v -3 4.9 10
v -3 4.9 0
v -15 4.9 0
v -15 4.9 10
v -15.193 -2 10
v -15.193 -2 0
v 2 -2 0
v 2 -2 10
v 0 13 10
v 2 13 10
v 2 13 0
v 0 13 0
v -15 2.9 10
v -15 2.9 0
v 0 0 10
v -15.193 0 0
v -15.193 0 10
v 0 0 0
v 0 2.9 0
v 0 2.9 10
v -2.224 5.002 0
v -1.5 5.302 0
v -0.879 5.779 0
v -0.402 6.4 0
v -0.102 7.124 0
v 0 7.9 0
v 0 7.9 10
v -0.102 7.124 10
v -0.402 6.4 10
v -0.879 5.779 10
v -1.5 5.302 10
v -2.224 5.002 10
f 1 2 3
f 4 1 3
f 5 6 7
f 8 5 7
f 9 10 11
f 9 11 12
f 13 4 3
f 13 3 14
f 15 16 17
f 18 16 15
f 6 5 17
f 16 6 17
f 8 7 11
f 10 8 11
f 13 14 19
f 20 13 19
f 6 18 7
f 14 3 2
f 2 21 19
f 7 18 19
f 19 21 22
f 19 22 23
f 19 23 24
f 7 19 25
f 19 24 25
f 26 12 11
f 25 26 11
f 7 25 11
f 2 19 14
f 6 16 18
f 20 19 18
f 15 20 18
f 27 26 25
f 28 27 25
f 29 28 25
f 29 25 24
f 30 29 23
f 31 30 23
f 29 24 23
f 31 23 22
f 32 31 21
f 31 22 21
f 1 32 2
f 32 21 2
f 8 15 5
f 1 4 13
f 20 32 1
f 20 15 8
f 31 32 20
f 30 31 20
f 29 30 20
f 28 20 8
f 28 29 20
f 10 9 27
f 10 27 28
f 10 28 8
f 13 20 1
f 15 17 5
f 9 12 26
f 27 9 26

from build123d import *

# Parameters (mm, degrees)
F0_W     = 15.193479
F0_H     = 2
F1_DEPTH = 10


with BuildPart() as f1:
    # F0 (on Top) → F1 (new body)
    with BuildSketch(Plane.XY):
        with Locations((-7.596739, -1)):
            Rectangle(F0_W, F0_H)
        with BuildLine():
            Line((0, 2.9), (0, 0))
            Line((0, 0), (0, -2))
            Line((0, -2), (2, -2))
            Line((2, -2), (2, 13))
            Line((2, 13), (0, 13))
            Line((0, 13), (0, 7.9))
            ThreePointArc((0, 7.9), (-0.87868, 5.77868), (-3, 4.9))
            Line((-3, 4.9), (-15, 4.9))
            Line((-15, 4.9), (-15, 2.9))
            Line((-15, 2.9), (0, 2.9))
        make_face()
    extrude(amount=F1_DEPTH)


solid = f1.part
